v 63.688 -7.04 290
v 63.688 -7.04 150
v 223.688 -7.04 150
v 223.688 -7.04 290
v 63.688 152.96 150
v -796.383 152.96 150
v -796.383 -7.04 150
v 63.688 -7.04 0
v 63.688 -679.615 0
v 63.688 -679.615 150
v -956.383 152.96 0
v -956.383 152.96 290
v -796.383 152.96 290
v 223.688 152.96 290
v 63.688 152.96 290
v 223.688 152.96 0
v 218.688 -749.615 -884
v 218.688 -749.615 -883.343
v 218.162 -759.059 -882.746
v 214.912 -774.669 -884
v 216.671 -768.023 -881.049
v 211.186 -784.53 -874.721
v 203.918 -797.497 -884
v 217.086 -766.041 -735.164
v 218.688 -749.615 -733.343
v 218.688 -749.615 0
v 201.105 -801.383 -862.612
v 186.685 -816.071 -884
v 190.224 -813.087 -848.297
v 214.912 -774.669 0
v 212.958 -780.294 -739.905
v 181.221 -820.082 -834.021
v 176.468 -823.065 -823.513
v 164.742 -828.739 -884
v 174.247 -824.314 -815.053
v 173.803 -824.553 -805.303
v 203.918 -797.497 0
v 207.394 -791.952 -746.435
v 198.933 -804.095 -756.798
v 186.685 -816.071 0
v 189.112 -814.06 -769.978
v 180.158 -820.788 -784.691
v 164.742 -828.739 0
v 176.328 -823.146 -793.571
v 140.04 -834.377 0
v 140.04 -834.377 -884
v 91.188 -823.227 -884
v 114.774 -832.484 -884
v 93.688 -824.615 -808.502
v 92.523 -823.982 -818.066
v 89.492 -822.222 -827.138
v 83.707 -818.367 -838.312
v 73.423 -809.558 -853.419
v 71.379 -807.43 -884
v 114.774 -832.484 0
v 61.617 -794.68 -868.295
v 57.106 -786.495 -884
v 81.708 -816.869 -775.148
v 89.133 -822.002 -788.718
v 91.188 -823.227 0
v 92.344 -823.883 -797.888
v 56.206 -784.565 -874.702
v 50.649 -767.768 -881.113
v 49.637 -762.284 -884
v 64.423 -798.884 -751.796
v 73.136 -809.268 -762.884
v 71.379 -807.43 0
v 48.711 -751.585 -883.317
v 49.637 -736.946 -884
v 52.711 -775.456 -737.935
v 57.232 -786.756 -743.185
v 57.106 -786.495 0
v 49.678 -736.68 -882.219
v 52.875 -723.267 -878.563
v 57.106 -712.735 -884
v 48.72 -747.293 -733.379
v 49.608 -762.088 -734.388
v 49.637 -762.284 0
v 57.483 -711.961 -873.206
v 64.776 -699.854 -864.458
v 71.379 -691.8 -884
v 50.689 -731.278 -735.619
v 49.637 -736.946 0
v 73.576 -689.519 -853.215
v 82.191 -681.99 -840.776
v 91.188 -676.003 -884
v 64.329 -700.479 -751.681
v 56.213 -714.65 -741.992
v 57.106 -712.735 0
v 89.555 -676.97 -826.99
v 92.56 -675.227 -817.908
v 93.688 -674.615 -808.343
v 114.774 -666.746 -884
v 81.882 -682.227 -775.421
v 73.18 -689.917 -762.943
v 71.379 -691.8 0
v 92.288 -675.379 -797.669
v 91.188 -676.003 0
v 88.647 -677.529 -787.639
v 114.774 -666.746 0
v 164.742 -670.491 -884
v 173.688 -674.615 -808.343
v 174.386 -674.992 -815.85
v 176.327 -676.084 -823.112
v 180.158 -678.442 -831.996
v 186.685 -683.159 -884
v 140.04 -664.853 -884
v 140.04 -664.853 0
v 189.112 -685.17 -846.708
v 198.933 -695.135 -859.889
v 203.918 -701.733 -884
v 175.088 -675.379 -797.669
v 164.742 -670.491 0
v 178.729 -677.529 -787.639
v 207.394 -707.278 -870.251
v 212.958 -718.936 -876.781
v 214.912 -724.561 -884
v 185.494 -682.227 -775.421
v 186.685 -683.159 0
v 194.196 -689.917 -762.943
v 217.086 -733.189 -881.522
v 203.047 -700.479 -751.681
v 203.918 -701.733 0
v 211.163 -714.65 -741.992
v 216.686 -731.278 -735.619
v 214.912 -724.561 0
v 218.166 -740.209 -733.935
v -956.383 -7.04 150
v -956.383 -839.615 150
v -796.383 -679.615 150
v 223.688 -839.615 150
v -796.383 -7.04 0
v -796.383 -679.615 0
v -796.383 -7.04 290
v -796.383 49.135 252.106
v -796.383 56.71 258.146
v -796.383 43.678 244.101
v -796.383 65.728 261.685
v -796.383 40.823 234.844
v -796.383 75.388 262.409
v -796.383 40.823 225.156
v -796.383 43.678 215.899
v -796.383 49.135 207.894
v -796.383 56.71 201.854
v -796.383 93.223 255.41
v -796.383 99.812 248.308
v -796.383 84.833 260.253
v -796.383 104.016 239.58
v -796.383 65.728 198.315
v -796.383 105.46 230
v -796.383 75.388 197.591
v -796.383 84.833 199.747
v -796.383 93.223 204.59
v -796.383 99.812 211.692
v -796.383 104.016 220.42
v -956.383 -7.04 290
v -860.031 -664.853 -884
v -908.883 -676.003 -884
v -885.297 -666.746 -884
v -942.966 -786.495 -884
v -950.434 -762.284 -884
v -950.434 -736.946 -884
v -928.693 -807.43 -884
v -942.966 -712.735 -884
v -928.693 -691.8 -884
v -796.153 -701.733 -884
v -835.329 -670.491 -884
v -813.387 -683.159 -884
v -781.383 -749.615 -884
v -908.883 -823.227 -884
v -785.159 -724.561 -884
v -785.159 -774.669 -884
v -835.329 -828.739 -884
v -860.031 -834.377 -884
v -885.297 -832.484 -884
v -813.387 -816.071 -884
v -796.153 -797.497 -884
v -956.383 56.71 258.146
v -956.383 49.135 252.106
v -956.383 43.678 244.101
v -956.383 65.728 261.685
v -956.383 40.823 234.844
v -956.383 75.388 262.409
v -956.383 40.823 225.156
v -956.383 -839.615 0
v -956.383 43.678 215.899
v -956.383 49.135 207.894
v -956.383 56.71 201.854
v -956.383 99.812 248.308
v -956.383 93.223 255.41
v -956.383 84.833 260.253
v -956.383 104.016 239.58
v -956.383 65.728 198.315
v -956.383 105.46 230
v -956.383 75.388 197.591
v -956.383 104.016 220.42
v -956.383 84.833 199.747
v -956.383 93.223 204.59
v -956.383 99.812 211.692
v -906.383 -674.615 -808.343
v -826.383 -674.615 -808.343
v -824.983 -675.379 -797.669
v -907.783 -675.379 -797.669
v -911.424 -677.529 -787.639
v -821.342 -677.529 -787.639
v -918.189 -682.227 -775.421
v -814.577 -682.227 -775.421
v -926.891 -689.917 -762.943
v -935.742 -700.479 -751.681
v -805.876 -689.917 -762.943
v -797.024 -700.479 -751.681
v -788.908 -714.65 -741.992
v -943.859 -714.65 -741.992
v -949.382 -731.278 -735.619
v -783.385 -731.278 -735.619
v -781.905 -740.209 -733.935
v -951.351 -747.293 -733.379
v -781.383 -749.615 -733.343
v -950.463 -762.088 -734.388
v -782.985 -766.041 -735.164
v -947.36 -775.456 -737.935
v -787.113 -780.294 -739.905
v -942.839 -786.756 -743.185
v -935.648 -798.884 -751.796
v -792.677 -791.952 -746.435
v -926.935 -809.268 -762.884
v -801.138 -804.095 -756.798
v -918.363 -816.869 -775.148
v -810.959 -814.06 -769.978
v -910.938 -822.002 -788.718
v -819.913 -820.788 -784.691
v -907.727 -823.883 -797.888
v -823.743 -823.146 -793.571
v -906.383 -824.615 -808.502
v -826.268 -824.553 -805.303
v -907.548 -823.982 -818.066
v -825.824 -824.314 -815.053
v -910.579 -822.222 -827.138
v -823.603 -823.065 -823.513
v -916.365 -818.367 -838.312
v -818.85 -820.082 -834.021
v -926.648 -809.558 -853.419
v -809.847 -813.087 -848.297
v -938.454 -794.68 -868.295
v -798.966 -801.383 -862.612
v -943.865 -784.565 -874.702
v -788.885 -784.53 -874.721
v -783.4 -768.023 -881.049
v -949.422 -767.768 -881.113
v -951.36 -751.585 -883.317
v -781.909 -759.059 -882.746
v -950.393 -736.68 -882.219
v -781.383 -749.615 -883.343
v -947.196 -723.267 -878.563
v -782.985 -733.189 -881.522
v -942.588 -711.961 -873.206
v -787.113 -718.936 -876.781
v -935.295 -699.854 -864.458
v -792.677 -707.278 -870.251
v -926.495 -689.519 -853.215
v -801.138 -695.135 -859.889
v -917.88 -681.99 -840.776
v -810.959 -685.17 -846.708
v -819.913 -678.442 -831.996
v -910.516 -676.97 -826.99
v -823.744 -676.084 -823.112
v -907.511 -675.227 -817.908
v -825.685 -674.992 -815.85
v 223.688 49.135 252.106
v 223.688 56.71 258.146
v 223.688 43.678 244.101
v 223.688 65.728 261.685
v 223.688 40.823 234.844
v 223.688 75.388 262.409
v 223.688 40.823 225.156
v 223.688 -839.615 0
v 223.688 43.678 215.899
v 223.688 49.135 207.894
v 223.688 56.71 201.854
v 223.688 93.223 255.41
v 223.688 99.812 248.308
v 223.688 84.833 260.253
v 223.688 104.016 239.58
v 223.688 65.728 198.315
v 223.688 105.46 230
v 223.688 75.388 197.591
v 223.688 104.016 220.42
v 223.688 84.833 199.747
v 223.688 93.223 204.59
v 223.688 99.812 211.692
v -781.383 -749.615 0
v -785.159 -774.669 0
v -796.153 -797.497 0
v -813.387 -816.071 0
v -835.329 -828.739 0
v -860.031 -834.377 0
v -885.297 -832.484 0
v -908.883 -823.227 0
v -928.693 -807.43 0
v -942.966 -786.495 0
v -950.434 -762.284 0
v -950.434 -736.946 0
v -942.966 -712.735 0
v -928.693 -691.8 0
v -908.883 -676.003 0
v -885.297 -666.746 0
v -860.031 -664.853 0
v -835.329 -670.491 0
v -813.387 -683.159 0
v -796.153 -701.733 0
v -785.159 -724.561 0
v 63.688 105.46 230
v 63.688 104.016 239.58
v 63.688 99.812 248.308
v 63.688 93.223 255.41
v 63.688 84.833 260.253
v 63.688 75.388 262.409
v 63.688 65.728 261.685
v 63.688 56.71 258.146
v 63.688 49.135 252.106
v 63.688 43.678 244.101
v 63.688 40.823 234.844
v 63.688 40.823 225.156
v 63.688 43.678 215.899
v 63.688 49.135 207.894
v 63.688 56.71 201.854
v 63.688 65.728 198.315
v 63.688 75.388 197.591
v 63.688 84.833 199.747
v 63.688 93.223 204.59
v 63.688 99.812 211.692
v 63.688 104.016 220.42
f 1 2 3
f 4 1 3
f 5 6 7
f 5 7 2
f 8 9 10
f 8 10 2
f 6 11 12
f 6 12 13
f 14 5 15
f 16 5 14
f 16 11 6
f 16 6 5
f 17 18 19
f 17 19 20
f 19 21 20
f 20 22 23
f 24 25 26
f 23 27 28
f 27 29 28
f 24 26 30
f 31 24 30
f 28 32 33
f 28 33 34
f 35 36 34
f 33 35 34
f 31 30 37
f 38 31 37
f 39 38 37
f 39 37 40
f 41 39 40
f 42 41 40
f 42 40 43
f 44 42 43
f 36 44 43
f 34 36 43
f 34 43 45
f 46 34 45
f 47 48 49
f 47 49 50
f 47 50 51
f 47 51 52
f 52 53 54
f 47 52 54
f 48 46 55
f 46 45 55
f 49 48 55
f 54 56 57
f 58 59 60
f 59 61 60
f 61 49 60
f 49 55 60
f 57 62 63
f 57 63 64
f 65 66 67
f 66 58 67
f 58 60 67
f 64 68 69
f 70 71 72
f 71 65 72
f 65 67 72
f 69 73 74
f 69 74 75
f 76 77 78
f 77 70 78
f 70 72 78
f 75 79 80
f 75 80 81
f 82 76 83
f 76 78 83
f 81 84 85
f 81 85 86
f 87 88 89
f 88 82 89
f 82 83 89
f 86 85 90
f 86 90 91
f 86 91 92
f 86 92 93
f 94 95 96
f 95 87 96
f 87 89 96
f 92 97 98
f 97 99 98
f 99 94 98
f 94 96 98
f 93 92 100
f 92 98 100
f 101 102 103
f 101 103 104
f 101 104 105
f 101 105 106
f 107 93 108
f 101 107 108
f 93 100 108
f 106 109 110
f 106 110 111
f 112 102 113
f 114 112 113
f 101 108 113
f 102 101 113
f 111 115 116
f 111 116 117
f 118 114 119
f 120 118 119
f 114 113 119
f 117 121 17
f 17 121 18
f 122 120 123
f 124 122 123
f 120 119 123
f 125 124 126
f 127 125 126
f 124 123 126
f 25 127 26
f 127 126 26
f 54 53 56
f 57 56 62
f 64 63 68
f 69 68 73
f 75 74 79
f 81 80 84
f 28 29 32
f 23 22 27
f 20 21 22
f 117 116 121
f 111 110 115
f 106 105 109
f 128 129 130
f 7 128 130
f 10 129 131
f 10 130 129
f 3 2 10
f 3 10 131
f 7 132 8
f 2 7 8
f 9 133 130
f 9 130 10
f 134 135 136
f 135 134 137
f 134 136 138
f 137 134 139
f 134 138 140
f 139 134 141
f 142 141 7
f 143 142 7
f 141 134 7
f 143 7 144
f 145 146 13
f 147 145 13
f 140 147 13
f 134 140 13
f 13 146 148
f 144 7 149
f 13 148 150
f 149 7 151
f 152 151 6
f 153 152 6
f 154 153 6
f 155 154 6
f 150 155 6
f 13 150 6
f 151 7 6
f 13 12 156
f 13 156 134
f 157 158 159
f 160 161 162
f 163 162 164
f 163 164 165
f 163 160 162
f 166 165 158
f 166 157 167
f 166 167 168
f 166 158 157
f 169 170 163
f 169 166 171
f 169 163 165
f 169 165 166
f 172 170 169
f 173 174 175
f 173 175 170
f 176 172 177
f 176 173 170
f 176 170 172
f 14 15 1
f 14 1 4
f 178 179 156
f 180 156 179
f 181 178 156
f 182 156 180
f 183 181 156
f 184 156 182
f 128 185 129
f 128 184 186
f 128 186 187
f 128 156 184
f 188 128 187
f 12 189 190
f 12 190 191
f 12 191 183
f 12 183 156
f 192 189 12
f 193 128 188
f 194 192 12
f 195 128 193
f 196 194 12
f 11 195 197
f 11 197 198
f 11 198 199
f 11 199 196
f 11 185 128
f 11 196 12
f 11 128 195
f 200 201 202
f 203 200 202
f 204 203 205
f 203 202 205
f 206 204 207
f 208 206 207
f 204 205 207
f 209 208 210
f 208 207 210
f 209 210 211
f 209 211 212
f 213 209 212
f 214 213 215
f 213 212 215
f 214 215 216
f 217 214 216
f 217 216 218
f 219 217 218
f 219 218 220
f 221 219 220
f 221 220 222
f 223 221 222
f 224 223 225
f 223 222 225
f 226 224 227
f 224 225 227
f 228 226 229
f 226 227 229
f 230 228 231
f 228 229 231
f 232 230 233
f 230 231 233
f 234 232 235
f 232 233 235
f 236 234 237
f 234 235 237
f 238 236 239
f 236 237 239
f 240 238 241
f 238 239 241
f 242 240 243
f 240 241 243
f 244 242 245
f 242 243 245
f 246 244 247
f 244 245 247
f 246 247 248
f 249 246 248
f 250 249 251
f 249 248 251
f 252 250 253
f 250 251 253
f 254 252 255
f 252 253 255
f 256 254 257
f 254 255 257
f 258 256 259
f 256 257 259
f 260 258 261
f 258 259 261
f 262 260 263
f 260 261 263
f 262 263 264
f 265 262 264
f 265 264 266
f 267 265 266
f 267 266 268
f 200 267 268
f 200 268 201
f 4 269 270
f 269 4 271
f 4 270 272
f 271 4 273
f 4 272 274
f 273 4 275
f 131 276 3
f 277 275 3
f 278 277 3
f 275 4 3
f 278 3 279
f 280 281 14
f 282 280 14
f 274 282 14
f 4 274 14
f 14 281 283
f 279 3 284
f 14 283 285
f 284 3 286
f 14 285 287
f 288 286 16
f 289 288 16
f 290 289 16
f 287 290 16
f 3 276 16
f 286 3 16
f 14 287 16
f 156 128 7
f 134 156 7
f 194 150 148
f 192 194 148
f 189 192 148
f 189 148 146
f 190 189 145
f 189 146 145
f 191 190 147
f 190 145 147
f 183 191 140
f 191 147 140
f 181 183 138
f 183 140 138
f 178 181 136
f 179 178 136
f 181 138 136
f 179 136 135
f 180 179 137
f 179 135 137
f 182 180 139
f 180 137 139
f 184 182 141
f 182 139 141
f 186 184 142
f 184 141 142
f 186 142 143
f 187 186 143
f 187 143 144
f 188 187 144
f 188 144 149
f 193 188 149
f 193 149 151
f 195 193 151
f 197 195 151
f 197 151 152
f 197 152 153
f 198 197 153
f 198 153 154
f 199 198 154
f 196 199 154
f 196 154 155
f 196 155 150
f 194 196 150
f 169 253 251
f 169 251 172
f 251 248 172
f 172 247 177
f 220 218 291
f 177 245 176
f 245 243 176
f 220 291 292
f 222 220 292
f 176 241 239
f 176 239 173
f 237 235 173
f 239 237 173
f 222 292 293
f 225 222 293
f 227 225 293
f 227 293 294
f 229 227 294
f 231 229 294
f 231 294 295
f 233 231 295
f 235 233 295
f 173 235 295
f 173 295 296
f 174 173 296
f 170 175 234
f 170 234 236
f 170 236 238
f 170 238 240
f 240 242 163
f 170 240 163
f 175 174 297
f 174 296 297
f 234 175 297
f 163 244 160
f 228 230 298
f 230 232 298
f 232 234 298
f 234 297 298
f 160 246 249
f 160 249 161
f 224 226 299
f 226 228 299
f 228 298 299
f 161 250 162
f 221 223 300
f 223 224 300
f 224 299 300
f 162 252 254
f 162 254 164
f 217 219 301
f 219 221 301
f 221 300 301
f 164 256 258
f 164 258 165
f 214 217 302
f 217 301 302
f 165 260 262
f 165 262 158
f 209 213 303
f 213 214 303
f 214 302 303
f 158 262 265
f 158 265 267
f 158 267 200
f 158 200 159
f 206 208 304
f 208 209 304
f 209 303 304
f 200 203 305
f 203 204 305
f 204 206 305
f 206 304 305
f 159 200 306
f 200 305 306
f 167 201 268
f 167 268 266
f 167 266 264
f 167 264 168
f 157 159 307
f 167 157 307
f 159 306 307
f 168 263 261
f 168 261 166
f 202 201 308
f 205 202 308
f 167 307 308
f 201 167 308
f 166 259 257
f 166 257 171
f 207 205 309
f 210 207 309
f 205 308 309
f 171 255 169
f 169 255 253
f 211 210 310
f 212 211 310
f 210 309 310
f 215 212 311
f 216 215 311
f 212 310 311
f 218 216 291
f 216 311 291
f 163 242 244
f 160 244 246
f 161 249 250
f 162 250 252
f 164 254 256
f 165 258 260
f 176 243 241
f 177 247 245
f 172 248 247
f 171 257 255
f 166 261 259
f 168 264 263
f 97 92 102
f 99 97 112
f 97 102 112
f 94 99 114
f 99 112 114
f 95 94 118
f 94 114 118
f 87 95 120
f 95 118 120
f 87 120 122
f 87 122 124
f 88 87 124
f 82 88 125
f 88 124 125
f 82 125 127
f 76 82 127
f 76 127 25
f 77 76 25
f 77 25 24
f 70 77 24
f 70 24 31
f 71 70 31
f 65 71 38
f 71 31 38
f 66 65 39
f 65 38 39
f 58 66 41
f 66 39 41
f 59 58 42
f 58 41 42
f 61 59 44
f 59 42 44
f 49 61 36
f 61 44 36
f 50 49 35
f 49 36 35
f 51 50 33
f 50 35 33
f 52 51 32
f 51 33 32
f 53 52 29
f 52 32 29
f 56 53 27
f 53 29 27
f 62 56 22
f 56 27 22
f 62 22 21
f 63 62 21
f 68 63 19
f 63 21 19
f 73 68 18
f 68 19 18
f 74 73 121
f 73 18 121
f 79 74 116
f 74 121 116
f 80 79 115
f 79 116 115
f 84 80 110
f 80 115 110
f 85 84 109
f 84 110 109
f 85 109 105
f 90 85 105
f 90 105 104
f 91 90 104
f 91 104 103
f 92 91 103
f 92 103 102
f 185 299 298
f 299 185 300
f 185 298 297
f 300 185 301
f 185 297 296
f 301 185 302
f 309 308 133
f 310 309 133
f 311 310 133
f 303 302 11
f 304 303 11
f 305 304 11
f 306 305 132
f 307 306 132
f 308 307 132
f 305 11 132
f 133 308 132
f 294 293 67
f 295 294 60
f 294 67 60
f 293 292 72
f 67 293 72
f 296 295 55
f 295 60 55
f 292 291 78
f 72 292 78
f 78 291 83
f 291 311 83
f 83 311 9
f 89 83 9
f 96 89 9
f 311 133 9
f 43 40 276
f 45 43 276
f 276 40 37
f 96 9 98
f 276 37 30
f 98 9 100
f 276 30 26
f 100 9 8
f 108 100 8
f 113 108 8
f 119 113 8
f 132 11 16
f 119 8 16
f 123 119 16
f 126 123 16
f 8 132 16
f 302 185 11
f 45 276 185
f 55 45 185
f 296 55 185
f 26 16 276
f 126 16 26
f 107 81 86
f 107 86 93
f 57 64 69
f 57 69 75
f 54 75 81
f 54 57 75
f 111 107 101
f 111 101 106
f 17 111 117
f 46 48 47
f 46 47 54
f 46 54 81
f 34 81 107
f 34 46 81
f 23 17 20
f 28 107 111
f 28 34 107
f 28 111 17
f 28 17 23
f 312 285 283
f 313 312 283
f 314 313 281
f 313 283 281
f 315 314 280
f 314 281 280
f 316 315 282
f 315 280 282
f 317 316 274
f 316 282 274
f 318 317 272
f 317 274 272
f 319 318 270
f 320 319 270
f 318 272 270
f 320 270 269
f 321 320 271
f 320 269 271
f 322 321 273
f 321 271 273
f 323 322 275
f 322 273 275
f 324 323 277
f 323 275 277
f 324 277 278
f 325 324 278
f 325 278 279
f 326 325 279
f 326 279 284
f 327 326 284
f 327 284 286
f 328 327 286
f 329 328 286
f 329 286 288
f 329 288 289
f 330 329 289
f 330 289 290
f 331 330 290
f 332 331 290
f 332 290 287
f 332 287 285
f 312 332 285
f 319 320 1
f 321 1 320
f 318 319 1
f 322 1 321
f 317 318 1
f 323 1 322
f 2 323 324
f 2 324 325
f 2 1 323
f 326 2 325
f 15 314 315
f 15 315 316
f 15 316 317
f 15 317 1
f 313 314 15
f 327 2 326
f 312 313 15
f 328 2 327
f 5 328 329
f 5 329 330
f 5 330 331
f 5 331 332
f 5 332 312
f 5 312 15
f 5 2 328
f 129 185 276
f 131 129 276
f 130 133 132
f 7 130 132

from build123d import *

# Parameters (mm, degrees)
SKETCH1_W           = 1180.071112
SKETCH1_H           = 992.574724554
SKETCH1_W_2         = 860.071112
SKETCH1_H_2         = 672.574724554
BOSS_EXTRUDE2_DEPTH = 150
SKETCH2_W           = 160
SKETCH2_H           = 160
BOSS_EXTRUDE3_DEPTH = 140
SKETCH4_R           = 85
BOSS_EXTRUDE4_DEPTH = 884
SKETCH5_R           = 75
CUT_EXTRUDE2_DEPTH  = 1704.724945294
SKETCH6_R           = 32.5
CUT_EXTRUDE3_DEPTH  = 1697.754922537


with BuildPart() as part:
    # Sketch1 → Boss-Extrude2 (new body)
    with BuildSketch(Plane.XY):
        with Locations((-366.347627568, -343.327690947)):
            Rectangle(SKETCH1_W, SKETCH1_H)
        with Locations((-366.347627568, -343.327690947)):
            Rectangle(SKETCH1_W_2, SKETCH1_H_2, mode=Mode.SUBTRACT)
    extrude(amount=BOSS_EXTRUDE2_DEPTH)

    # Sketch2 → Boss-Extrude3 (add)
    with BuildSketch(Plane.XY.offset(150)):
        with Locations((-876.383183568, 72.95967133)):
            Rectangle(SKETCH2_W, SKETCH2_H)
        with Locations((143.687928432, 72.95967133)):
            Rectangle(SKETCH2_W, SKETCH2_H)
    extrude(amount=BOSS_EXTRUDE3_DEPTH)

    # Sketch4 → Boss-Extrude4 (add)
    with BuildSketch(Plane(origin=(0, 0, 0), x_dir=(-1, 0, 0), z_dir=(0, 0, -1))):
        with Locations(Location((-133.687928432, -749.615053224, 0), (0, 0, 180))):
            Circle(SKETCH4_R)
        with Locations(Location((866.383183568, -749.615053224, 0), (0, 0, 180))):
            Circle(SKETCH4_R)
    extrude(amount=BOSS_EXTRUDE4_DEPTH)

    # Sketch5 → Cut-Extrude2 (cut, through all)
    with BuildSketch(Plane(origin=(233.687928432, 0, 0), x_dir=(0, 0, -1), z_dir=(1, 0, 0))):
        with Locations(Location((808.343239866, -749.615053224, 0), (0, 0, 90))):
            Circle(SKETCH5_R)
    extrude(amount=-CUT_EXTRUDE2_DEPTH, mode=Mode.SUBTRACT)

    # Sketch6 → Cut-Extrude3 (cut, through all)
    with BuildSketch(Plane(origin=(223.687928432, 0, 0), x_dir=(0, 0, -1), z_dir=(1, 0, 0))):
        with Locations(Location((-230, 72.95967133, 0), (0, 0, 90))):
            Circle(SKETCH6_R)
    extrude(amount=-CUT_EXTRUDE3_DEPTH, mode=Mode.SUBTRACT)


solid = part.part
